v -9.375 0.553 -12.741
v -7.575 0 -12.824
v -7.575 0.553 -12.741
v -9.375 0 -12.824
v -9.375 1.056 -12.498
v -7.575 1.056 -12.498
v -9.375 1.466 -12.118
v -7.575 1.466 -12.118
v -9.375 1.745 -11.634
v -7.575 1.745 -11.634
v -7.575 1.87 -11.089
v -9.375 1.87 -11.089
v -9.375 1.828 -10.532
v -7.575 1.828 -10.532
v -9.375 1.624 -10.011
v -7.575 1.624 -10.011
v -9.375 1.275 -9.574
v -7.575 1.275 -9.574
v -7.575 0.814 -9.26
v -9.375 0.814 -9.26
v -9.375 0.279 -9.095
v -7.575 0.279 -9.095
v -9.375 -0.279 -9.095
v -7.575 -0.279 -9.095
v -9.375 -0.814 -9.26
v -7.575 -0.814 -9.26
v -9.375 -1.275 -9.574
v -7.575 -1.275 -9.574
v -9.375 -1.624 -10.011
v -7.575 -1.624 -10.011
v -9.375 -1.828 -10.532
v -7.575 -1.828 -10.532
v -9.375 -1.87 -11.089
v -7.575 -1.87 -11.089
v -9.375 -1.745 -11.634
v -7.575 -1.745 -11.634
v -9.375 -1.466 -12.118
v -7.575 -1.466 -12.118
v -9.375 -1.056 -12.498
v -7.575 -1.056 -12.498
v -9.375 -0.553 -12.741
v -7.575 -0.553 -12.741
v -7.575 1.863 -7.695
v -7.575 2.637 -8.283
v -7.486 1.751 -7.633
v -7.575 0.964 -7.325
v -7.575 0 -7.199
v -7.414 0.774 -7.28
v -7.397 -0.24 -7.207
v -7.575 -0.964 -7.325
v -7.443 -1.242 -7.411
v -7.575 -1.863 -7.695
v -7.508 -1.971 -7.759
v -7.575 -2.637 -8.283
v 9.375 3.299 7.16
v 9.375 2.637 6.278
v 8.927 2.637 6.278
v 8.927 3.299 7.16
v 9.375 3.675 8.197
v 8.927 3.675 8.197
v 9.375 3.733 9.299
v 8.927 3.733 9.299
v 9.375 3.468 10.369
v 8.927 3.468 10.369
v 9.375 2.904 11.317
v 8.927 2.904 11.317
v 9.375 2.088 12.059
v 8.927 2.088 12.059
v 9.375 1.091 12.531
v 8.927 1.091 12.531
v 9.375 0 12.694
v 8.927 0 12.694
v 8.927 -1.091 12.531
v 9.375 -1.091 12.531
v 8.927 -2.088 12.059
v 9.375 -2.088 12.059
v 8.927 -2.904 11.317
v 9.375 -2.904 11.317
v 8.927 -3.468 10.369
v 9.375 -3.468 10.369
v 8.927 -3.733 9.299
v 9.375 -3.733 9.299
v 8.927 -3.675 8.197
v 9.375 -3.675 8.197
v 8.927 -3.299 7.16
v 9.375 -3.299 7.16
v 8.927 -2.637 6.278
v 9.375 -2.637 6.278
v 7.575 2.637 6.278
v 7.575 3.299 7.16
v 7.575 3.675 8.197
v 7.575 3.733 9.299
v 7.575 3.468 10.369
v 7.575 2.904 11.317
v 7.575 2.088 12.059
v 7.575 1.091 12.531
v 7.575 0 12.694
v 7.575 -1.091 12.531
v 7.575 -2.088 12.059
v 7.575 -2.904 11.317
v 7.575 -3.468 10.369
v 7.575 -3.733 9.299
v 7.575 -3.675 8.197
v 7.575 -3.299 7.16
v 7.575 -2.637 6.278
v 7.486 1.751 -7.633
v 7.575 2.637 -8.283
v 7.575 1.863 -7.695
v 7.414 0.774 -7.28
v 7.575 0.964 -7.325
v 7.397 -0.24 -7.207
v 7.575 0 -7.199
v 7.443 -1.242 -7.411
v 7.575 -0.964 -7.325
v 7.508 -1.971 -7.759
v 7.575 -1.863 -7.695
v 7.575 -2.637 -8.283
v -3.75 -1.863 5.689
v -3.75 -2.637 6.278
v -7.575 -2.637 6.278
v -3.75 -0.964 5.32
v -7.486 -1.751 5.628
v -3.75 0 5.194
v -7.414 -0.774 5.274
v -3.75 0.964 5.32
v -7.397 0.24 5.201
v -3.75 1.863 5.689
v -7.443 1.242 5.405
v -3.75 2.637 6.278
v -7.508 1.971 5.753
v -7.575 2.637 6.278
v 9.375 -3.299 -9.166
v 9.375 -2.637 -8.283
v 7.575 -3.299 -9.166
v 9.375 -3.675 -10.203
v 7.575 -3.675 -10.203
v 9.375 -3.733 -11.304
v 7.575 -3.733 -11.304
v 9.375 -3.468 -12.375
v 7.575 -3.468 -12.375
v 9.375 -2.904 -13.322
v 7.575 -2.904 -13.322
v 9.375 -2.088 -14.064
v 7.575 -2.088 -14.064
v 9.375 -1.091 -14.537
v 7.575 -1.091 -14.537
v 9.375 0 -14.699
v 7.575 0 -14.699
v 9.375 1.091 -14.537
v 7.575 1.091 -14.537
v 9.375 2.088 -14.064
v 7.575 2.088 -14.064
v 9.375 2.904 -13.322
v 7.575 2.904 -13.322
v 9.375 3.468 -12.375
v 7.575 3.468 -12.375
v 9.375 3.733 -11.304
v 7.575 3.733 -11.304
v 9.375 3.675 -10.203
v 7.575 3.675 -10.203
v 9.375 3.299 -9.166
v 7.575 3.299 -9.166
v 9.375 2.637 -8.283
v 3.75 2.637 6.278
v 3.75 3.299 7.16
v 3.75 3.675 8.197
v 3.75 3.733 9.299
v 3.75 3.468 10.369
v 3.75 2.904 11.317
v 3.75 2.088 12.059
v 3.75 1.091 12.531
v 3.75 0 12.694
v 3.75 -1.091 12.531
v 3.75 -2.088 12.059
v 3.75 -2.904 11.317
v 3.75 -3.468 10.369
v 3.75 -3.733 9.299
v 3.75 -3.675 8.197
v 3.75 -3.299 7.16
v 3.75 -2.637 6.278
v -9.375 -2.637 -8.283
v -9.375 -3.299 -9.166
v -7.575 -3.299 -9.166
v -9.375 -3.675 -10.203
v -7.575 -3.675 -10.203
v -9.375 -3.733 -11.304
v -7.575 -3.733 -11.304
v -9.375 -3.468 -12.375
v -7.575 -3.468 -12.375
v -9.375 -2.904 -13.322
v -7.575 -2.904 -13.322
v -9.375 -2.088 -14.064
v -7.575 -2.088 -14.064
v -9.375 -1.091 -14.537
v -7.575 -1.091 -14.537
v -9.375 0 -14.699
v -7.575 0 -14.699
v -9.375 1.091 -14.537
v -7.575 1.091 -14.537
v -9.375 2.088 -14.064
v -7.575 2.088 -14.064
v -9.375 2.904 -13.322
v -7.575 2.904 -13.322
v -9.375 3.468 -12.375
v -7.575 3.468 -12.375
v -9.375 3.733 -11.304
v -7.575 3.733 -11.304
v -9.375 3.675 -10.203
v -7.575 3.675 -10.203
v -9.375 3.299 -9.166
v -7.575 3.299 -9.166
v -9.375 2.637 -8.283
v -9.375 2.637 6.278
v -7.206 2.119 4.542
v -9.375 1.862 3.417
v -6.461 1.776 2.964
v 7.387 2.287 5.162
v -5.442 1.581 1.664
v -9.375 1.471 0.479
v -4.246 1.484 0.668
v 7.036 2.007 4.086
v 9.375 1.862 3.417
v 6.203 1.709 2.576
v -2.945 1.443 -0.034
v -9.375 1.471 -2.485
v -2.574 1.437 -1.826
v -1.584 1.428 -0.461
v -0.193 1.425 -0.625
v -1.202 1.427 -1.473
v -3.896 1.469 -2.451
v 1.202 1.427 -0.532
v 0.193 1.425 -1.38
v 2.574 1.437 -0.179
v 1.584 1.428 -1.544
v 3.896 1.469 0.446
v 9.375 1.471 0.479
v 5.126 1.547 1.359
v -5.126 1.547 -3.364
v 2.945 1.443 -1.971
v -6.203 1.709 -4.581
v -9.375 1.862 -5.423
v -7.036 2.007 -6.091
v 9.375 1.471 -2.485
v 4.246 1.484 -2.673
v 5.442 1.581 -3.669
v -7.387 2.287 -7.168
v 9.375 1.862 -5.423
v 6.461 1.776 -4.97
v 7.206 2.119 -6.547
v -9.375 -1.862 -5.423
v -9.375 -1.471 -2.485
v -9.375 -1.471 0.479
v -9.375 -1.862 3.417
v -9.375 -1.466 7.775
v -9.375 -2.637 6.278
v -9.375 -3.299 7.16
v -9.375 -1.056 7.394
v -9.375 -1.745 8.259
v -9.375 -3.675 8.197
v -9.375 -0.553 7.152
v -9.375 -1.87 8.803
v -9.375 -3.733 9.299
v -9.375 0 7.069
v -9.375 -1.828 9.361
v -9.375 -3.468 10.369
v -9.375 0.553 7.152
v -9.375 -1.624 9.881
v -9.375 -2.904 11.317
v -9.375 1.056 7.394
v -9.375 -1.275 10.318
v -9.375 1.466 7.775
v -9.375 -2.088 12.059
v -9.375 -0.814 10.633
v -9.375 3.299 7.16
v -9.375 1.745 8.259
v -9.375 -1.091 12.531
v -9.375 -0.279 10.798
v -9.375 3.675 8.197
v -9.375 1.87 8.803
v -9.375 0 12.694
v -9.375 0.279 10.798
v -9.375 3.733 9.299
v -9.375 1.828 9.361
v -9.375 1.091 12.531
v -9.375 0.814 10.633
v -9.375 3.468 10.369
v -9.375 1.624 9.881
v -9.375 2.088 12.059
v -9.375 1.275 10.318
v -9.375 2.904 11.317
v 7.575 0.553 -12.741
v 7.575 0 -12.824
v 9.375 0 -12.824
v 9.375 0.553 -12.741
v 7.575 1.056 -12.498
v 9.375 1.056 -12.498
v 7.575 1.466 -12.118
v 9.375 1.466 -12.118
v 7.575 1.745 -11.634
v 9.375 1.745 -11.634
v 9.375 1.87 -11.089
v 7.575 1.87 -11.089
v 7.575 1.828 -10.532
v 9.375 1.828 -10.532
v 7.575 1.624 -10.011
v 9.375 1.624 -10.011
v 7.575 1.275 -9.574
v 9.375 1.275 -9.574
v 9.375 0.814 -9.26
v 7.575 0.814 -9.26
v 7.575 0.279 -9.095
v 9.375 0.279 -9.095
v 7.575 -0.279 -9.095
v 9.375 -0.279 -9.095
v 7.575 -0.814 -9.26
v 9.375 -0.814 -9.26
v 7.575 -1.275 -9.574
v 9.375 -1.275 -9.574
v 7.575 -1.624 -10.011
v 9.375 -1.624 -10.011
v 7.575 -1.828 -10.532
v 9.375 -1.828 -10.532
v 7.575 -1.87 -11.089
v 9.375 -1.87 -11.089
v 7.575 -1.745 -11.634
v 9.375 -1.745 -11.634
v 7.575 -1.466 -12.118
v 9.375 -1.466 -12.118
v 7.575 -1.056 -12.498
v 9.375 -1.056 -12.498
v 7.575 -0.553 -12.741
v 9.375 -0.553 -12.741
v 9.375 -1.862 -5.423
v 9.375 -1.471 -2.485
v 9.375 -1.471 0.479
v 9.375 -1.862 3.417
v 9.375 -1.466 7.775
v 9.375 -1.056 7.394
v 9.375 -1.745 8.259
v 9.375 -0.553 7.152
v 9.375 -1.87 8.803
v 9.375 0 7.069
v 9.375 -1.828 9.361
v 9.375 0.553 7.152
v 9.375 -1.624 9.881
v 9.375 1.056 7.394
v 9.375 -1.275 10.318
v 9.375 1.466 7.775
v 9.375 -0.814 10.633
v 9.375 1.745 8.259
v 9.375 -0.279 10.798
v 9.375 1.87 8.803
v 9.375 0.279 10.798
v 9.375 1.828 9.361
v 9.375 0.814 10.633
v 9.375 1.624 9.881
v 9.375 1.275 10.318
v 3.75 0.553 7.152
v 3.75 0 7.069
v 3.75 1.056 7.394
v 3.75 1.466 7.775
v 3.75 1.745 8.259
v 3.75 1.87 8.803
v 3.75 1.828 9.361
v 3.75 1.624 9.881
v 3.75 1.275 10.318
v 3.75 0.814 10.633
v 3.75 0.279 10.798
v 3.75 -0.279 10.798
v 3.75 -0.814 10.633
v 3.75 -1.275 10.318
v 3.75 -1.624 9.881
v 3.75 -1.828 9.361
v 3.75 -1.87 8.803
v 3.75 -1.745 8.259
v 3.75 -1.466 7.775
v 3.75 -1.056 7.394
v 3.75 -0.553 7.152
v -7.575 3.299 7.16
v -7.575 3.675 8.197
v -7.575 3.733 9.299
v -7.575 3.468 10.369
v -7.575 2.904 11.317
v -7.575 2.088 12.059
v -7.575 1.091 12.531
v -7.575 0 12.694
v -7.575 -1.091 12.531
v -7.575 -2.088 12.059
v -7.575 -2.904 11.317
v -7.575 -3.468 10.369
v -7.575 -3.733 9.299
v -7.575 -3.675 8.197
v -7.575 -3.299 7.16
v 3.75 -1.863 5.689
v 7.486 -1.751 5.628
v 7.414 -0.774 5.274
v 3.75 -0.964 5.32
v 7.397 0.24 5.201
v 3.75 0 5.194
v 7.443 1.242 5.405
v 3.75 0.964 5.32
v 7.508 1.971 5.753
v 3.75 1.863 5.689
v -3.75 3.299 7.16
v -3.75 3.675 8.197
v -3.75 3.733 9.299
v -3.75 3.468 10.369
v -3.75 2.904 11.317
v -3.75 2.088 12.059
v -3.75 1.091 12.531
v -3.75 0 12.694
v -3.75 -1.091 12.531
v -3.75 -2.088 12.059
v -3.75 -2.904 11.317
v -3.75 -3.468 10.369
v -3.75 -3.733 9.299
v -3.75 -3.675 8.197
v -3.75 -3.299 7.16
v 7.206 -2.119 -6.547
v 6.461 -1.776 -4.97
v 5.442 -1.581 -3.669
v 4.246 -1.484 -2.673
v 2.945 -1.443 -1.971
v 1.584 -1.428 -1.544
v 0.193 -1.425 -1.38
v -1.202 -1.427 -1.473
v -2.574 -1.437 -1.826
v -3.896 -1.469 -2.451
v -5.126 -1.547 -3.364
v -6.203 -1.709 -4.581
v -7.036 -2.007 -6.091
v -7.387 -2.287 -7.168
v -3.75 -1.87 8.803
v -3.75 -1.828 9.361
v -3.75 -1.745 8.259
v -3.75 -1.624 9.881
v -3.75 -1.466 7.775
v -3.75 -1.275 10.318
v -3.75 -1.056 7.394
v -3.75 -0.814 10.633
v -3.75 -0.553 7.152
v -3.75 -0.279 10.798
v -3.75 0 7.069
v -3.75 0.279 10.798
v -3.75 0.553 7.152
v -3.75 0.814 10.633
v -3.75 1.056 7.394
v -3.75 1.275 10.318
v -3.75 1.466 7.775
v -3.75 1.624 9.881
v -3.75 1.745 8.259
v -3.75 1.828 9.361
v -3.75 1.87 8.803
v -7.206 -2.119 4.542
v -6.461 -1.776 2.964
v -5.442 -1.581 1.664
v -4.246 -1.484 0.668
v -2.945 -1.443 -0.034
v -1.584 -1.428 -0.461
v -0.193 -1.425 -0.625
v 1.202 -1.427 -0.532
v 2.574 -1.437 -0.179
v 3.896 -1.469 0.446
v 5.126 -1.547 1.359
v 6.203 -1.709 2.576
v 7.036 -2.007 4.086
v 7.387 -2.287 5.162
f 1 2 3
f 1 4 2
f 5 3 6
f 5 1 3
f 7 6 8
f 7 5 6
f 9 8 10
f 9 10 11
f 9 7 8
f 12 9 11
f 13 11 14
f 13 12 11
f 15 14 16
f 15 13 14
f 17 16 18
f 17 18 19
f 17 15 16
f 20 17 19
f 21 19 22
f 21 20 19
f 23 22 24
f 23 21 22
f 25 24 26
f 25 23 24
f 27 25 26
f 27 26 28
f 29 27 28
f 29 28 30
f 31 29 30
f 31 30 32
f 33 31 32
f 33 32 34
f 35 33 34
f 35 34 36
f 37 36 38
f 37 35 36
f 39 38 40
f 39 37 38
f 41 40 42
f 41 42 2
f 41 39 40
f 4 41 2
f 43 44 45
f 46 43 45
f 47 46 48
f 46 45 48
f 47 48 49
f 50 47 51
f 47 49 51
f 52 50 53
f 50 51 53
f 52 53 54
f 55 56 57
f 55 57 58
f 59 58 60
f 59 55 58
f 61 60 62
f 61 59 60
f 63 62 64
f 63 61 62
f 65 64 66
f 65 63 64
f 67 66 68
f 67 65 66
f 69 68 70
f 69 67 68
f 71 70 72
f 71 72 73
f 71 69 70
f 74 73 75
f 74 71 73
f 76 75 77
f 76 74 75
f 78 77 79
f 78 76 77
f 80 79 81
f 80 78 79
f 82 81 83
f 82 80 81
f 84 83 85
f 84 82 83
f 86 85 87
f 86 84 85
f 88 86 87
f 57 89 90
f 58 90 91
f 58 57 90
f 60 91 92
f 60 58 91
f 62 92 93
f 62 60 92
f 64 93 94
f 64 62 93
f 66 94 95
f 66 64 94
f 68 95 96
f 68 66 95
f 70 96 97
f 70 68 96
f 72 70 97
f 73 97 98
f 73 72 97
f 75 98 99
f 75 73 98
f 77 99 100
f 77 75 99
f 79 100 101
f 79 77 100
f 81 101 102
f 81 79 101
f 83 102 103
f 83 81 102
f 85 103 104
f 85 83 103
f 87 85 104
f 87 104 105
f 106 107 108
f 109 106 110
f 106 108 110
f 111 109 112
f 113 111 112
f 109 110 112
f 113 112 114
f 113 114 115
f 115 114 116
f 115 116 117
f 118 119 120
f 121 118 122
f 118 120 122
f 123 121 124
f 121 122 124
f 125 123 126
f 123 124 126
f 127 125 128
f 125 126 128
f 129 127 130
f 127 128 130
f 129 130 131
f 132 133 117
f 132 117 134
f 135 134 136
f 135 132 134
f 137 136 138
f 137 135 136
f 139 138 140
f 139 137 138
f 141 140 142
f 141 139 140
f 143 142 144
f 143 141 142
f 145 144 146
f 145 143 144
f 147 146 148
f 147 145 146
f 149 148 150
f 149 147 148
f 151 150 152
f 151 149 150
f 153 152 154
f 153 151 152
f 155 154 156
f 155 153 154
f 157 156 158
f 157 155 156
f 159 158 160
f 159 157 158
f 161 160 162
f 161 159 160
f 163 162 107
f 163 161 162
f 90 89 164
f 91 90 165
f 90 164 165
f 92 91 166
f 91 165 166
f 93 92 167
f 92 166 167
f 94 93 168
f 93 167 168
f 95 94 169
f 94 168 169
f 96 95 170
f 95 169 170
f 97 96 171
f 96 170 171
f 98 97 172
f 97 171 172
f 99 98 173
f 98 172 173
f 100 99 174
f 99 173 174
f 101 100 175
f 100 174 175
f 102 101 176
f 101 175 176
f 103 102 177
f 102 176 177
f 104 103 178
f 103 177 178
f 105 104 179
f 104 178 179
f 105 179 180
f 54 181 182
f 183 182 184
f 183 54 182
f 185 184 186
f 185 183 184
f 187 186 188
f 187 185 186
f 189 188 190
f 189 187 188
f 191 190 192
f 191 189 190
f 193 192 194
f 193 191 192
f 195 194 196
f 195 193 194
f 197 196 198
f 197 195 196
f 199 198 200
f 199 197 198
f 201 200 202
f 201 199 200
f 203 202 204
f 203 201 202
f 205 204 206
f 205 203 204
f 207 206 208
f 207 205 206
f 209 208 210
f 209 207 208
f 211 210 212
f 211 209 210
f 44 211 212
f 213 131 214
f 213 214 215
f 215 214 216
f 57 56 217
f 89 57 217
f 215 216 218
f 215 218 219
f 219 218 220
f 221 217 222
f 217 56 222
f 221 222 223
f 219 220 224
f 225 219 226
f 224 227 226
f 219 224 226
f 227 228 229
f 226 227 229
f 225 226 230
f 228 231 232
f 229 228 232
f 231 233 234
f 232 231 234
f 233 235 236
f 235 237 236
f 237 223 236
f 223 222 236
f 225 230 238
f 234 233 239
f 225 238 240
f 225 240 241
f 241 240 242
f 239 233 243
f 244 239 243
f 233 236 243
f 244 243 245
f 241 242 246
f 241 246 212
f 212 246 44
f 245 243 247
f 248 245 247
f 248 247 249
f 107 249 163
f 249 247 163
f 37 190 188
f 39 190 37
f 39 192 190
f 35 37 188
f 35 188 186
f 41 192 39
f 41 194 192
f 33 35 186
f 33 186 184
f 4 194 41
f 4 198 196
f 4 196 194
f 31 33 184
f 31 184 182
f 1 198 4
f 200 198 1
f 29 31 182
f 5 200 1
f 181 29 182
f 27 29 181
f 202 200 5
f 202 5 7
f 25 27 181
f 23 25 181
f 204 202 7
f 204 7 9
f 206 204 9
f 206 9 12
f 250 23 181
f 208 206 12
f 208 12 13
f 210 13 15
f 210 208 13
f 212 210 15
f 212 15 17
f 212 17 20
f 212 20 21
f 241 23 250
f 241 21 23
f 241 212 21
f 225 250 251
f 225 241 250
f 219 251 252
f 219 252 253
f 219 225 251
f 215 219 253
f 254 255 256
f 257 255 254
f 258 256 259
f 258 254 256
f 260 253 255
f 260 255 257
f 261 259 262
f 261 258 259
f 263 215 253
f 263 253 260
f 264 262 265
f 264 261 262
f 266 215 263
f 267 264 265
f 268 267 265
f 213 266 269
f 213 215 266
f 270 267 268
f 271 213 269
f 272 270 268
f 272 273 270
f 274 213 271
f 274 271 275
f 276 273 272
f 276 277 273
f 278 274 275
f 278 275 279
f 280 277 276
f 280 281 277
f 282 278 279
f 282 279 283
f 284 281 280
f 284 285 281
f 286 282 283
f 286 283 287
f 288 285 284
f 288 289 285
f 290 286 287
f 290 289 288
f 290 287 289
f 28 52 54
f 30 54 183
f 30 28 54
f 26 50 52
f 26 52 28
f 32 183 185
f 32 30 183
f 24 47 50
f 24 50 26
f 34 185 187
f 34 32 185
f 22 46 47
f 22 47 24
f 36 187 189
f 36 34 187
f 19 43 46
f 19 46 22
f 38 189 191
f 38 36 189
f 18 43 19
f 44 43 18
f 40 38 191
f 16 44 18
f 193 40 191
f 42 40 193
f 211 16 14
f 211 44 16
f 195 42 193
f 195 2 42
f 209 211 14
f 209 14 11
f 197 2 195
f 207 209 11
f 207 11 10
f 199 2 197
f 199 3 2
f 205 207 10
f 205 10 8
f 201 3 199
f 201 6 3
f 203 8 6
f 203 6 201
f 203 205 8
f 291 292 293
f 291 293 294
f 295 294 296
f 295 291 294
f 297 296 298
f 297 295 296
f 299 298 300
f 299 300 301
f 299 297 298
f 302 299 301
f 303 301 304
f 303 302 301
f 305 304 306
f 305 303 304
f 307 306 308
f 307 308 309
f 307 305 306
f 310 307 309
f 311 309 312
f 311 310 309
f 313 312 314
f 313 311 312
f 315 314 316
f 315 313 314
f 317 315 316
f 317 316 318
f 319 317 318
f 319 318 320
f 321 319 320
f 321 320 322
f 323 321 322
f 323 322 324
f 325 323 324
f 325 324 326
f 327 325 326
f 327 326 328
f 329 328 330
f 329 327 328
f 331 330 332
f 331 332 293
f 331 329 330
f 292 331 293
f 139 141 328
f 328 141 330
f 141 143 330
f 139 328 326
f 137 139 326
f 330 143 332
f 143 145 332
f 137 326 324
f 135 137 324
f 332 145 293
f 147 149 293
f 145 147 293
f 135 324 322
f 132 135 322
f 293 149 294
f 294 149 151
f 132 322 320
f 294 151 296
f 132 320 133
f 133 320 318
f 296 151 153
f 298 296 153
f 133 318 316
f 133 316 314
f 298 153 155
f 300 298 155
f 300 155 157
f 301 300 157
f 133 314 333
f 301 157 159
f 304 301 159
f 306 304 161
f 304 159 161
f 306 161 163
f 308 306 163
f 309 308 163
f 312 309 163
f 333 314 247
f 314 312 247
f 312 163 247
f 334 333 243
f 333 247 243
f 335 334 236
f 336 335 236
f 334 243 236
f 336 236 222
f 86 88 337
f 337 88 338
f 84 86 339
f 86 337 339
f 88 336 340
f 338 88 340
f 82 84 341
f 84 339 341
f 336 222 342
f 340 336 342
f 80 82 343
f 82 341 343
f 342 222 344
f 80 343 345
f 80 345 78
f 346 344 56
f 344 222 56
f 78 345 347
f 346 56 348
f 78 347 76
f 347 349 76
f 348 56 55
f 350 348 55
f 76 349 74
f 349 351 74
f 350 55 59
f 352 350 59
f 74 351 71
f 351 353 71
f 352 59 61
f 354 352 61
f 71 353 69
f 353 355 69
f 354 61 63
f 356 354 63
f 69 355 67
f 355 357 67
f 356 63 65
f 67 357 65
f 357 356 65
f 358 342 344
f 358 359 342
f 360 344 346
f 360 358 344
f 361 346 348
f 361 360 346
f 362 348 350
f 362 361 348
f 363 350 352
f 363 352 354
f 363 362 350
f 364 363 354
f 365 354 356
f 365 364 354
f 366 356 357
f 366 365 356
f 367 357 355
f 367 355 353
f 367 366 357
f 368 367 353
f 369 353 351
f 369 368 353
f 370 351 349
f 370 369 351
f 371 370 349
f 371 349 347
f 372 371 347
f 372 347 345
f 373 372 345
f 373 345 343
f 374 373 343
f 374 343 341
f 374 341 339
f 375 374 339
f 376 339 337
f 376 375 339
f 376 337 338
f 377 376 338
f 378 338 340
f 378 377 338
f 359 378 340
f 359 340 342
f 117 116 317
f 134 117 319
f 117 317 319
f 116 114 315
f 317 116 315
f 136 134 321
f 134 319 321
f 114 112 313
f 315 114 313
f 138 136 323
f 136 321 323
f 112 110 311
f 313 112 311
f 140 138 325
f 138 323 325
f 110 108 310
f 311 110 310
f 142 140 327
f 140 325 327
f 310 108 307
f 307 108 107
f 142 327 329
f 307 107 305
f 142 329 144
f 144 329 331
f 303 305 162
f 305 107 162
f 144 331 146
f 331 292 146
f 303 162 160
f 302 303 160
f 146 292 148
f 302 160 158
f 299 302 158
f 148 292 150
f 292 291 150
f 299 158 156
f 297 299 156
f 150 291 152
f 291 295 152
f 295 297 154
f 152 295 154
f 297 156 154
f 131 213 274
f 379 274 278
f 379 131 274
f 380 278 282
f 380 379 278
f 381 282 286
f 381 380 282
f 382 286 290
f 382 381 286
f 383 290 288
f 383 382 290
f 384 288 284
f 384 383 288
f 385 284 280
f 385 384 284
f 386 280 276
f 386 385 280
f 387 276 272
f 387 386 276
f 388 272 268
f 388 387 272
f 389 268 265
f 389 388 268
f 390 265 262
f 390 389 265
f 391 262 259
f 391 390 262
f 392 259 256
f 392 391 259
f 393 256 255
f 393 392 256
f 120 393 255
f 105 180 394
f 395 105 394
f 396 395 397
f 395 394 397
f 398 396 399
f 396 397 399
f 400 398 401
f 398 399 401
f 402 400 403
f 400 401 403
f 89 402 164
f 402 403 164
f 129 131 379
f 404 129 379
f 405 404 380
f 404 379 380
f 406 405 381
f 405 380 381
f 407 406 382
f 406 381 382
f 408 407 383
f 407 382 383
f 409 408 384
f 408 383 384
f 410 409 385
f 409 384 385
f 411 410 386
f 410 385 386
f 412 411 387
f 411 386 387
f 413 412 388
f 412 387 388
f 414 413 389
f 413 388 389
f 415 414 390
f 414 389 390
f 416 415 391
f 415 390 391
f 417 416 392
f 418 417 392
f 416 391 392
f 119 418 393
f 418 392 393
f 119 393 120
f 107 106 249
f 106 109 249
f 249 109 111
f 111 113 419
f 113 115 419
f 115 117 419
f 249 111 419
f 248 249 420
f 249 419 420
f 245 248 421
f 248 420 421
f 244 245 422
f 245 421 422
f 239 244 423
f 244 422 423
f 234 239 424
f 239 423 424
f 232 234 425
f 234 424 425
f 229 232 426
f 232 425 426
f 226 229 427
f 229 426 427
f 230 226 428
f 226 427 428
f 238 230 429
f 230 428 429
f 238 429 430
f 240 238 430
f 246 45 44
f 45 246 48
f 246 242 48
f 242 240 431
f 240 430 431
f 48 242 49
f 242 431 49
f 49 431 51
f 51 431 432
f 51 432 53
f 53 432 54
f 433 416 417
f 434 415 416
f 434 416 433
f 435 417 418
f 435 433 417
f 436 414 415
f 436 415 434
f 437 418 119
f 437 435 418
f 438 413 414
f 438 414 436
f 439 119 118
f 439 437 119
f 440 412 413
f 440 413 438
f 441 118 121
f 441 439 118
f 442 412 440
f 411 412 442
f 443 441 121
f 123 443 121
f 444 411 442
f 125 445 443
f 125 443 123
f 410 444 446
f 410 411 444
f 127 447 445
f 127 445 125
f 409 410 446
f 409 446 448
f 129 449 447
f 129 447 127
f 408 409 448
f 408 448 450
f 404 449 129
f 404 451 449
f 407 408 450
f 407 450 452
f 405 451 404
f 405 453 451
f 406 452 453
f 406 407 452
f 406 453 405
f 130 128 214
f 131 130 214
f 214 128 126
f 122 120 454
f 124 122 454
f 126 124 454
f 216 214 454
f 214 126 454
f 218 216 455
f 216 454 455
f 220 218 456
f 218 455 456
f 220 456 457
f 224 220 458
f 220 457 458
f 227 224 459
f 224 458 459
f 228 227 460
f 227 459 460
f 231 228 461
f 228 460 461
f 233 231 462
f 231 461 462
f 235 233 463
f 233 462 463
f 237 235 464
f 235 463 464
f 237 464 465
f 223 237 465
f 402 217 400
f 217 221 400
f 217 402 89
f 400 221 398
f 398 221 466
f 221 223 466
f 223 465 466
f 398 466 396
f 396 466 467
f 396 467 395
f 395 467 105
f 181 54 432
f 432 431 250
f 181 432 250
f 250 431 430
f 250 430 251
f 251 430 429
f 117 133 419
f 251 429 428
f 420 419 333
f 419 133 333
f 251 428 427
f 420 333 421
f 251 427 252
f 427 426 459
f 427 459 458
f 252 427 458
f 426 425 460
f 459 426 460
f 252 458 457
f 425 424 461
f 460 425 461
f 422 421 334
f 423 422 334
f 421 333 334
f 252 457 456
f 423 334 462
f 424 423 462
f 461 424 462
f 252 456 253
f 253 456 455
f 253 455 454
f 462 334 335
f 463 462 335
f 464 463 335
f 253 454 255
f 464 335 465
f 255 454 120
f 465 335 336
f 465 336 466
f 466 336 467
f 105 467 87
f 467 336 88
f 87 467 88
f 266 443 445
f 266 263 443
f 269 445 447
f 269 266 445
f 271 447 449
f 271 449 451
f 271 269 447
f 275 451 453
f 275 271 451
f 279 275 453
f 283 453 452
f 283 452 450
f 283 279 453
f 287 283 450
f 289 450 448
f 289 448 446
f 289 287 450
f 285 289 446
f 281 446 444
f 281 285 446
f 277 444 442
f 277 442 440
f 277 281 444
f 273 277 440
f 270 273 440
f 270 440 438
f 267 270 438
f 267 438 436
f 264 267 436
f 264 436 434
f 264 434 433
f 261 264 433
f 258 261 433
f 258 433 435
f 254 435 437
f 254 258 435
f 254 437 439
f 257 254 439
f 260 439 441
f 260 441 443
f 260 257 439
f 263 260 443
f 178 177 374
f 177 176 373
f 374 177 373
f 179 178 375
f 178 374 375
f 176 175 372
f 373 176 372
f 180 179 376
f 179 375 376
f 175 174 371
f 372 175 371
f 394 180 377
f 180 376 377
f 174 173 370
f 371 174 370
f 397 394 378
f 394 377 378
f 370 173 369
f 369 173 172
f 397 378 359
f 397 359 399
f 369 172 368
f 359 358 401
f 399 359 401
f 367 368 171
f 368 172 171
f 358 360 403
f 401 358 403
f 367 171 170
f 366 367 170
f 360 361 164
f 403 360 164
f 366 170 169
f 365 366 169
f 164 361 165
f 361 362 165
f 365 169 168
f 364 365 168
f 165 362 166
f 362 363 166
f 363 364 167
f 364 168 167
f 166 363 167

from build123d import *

# Parameters (mm, degrees)
SKETCH2_R               = 2.5
SKETCH2_R_2             = 1.25
BOSS_EXTRUDE1_DEPTH     = 6.25
BOSS_EXTRUDE1_2_DEPTH   = 6.25
SKETCH3_R               = 2.5
SKETCH3_R_2             = 1.25
CUT_EXTRUDE1_DEPTH      = 5.05
BOSS_EXTRUDE2_DEPTH     = 6.25
CUT_EXTRUDE2_DEPTH      = 12.34392559
CUT_EXTRUDE2_DEPTH_BACK = 12.34392559
SKETCH6_R               = 1.25
BOSS_EXTRUDE3_DEPTH     = 11.001
SKETCH7_R               = 2.5
SKETCH7_R_2             = 1.25
CUT_EXTRUDE3_DEPTH      = 2.5
SCALE1_SCALE            = 1.5


with BuildPart() as part:
    # Sketch2 → Boss-Extrude1 (new, symmetric)
    with BuildSketch(Plane(origin=(0, 0, 0), x_dir=(0, 0, -1), z_dir=(1, 0, 0))):
        with Locations((6.630835, 0)):
            Circle(SKETCH2_R)
        with Locations((6.630835, 0)):
            Circle(SKETCH2_R_2, mode=Mode.SUBTRACT)
    extrude(amount=BOSS_EXTRUDE1_DEPTH, both=True)


with BuildPart() as body_2:
    # Sketch2 → Boss-Extrude1 2 (new, symmetric)
    with BuildSketch(Plane(origin=(0, 0, 0), x_dir=(0, 0, -1), z_dir=(1, 0, 0))):
        with Locations((-6.630835, 0)):
            Circle(SKETCH2_R)
        with Locations((-6.630835, 0)):
            Circle(SKETCH2_R_2, mode=Mode.SUBTRACT)
    extrude(amount=BOSS_EXTRUDE1_2_DEPTH, both=True)


with BuildPart() as cut_extrude1_tool:
    # Sketch3 → Cut-Extrude1 (new, symmetric)
    # profile 1 of 2: a face of its own
    with BuildSketch(Plane(origin=(0, 0, 0), x_dir=(0, 0, -1), z_dir=(1, 0, 0))):
        with Locations((6.630835, 0)):
            Circle(SKETCH3_R)
        with Locations((6.630835, 0)):
            Circle(SKETCH3_R_2, mode=Mode.SUBTRACT)
    # profile 2 of 2: a face of its own
    with BuildSketch(Plane(origin=(0, 0, 0), x_dir=(0, 0, -1), z_dir=(1, 0, 0))):
        with Locations((-6.630835, 0)):
            Circle(SKETCH3_R)
        with Locations((-6.630835, 0)):
            Circle(SKETCH3_R_2, mode=Mode.SUBTRACT)
    extrude(amount=CUT_EXTRUDE1_DEPTH, both=True)


with BuildPart() as part_1:
    add(part.part)

    # Cut-Extrude1: cut by cut_extrude1_tool
    add(cut_extrude1_tool.part, mode=Mode.SUBTRACT)


with BuildPart() as body_2_1:
    add(body_2.part)

    # Cut-Extrude1: cut by cut_extrude1_tool
    add(cut_extrude1_tool.part, mode=Mode.SUBTRACT)


with BuildPart() as cut_extrude1_piece_1:
    # of the separate pieces the step leaves, piece 1, a body of its own (cut_extrude1_pieces)
    add(part_1.part.solids().sort_by_distance((-6.25, 0, -9.130835))[0])



with BuildPart() as cut_extrude1_piece_2:
    # of the separate pieces the step leaves, piece 2, a body of its own (cut_extrude1_pieces)
    add(part_1.part.solids().sort_by_distance((5.05, 0, -9.130835))[0])


with BuildPart() as cut_extrude1_piece_1_of_body_2:
    # of the separate pieces the step leaves, piece 1, a body of its own (cut_extrude1_pieces_of_body_2)
    add(body_2_1.part.solids().sort_by_distance((-6.25, 0, 4.130835))[0])


with BuildPart() as cut_extrude1_piece_2_of_body_2:
    # of the separate pieces the step leaves, piece 2, a body of its own (cut_extrude1_pieces_of_body_2)
    add(body_2_1.part.solids().sort_by_distance((5.05, 0, 4.130835))[0])


with BuildPart() as cut_extrude1_piece_1_1:
    add(cut_extrude1_piece_1.part)

    add(cut_extrude1_piece_2.part)  # Boss-Extrude2 merges Cut-Extrude1 piece 2

    add(cut_extrude1_piece_1_of_body_2.part)  # Boss-Extrude2 merges Cut-Extrude1 piece 1 of body 2

    add(cut_extrude1_piece_2_of_body_2.part)  # Boss-Extrude2 merges Cut-Extrude1 piece 2 of body 2
    # Sketch4 → Boss-Extrude2 (add, symmetric)
    with BuildSketch(Plane(origin=(0, 0, 0), x_dir=(0, 0, -1), z_dir=(1, 0, 0))):
        with BuildLine():
            ThreePointArc((4.853650324, 1.758298788), (4.130835, 0), (4.853650324, -1.758298788))
            ThreePointArc((4.853650324, -1.758298788), (0, -0.947912117), (-4.853650324, -1.758298788))
            ThreePointArc((-4.853650324, -1.758298788), (-4.130835, 0), (-4.853650324, 1.758298788))
            ThreePointArc((-4.853650324, 1.758298788), (0, 0.947912117), (4.853650324, 1.758298788))
        make_face()
    extrude(amount=BOSS_EXTRUDE2_DEPTH, both=True)

    # Sketch5 → Cut-Extrude2 (cut, two sides: drawn at the far end of the back side and taken through both)
    with BuildSketch(Plane(origin=(0, 0, 0), x_dir=(1, 0, 0), z_dir=(0, 1, 0)).offset(-CUT_EXTRUDE2_DEPTH_BACK)):
        with BuildLine():
            Line((-5.05, 4.853650324), (5.05, 4.853650324))
            ThreePointArc((5.05, 4.853650324), (0, 0.25), (-5.05, 4.853650324))
        make_face()
        with BuildLine():
            Line((5.05, -4.853650324), (-5.05, -4.853650324))
            ThreePointArc((-5.05, -4.853650324), (0, -0.25), (5.05, -4.853650324))
        make_face()
    extrude(amount=CUT_EXTRUDE2_DEPTH + CUT_EXTRUDE2_DEPTH_BACK, mode=Mode.SUBTRACT)

    # Sketch6 → Boss-Extrude3 (add)
    with BuildSketch(Plane(origin=(-5.05, 0, 0), x_dir=(0, 0, -1), z_dir=(1, 0, 0))):
        with BuildLine():
            ThreePointArc((-4.853650324, 1.758298788), (-9.130835, 0), (-4.853650324, -1.758298788))
            ThreePointArc((-4.853650324, -1.758298788), (-4.130835, 0), (-4.853650324, 1.758298788))
        make_face()
        with Locations((-6.630835, 0)):
            Circle(SKETCH6_R, mode=Mode.SUBTRACT)
    extrude(amount=BOSS_EXTRUDE3_DEPTH)

    # Sketch7 → Cut-Extrude3 (cut, symmetric)
    with BuildSketch(Plane(origin=(0, 0, 0), x_dir=(0, 0, -1), z_dir=(1, 0, 0))):
        with Locations(Location((-6.630835, 0, 0), (0, 0, 44.693939637))):
            Circle(SKETCH7_R)
        with Locations((-6.630835, 0)):
            Circle(SKETCH7_R_2, mode=Mode.SUBTRACT)
    extrude(amount=CUT_EXTRUDE3_DEPTH, both=True, mode=Mode.SUBTRACT)


with BuildPart() as cut_extrude1_piece_1_2:
    # Scale1: scaled about (-1.5e-08, -4.9e-08, 2.005345841)
    add(cut_extrude1_piece_1_1.part.scale(SCALE1_SCALE).moved(Location((7e-09, 2.5e-08, -1.002672921))))


solid = cut_extrude1_piece_1_2.part
